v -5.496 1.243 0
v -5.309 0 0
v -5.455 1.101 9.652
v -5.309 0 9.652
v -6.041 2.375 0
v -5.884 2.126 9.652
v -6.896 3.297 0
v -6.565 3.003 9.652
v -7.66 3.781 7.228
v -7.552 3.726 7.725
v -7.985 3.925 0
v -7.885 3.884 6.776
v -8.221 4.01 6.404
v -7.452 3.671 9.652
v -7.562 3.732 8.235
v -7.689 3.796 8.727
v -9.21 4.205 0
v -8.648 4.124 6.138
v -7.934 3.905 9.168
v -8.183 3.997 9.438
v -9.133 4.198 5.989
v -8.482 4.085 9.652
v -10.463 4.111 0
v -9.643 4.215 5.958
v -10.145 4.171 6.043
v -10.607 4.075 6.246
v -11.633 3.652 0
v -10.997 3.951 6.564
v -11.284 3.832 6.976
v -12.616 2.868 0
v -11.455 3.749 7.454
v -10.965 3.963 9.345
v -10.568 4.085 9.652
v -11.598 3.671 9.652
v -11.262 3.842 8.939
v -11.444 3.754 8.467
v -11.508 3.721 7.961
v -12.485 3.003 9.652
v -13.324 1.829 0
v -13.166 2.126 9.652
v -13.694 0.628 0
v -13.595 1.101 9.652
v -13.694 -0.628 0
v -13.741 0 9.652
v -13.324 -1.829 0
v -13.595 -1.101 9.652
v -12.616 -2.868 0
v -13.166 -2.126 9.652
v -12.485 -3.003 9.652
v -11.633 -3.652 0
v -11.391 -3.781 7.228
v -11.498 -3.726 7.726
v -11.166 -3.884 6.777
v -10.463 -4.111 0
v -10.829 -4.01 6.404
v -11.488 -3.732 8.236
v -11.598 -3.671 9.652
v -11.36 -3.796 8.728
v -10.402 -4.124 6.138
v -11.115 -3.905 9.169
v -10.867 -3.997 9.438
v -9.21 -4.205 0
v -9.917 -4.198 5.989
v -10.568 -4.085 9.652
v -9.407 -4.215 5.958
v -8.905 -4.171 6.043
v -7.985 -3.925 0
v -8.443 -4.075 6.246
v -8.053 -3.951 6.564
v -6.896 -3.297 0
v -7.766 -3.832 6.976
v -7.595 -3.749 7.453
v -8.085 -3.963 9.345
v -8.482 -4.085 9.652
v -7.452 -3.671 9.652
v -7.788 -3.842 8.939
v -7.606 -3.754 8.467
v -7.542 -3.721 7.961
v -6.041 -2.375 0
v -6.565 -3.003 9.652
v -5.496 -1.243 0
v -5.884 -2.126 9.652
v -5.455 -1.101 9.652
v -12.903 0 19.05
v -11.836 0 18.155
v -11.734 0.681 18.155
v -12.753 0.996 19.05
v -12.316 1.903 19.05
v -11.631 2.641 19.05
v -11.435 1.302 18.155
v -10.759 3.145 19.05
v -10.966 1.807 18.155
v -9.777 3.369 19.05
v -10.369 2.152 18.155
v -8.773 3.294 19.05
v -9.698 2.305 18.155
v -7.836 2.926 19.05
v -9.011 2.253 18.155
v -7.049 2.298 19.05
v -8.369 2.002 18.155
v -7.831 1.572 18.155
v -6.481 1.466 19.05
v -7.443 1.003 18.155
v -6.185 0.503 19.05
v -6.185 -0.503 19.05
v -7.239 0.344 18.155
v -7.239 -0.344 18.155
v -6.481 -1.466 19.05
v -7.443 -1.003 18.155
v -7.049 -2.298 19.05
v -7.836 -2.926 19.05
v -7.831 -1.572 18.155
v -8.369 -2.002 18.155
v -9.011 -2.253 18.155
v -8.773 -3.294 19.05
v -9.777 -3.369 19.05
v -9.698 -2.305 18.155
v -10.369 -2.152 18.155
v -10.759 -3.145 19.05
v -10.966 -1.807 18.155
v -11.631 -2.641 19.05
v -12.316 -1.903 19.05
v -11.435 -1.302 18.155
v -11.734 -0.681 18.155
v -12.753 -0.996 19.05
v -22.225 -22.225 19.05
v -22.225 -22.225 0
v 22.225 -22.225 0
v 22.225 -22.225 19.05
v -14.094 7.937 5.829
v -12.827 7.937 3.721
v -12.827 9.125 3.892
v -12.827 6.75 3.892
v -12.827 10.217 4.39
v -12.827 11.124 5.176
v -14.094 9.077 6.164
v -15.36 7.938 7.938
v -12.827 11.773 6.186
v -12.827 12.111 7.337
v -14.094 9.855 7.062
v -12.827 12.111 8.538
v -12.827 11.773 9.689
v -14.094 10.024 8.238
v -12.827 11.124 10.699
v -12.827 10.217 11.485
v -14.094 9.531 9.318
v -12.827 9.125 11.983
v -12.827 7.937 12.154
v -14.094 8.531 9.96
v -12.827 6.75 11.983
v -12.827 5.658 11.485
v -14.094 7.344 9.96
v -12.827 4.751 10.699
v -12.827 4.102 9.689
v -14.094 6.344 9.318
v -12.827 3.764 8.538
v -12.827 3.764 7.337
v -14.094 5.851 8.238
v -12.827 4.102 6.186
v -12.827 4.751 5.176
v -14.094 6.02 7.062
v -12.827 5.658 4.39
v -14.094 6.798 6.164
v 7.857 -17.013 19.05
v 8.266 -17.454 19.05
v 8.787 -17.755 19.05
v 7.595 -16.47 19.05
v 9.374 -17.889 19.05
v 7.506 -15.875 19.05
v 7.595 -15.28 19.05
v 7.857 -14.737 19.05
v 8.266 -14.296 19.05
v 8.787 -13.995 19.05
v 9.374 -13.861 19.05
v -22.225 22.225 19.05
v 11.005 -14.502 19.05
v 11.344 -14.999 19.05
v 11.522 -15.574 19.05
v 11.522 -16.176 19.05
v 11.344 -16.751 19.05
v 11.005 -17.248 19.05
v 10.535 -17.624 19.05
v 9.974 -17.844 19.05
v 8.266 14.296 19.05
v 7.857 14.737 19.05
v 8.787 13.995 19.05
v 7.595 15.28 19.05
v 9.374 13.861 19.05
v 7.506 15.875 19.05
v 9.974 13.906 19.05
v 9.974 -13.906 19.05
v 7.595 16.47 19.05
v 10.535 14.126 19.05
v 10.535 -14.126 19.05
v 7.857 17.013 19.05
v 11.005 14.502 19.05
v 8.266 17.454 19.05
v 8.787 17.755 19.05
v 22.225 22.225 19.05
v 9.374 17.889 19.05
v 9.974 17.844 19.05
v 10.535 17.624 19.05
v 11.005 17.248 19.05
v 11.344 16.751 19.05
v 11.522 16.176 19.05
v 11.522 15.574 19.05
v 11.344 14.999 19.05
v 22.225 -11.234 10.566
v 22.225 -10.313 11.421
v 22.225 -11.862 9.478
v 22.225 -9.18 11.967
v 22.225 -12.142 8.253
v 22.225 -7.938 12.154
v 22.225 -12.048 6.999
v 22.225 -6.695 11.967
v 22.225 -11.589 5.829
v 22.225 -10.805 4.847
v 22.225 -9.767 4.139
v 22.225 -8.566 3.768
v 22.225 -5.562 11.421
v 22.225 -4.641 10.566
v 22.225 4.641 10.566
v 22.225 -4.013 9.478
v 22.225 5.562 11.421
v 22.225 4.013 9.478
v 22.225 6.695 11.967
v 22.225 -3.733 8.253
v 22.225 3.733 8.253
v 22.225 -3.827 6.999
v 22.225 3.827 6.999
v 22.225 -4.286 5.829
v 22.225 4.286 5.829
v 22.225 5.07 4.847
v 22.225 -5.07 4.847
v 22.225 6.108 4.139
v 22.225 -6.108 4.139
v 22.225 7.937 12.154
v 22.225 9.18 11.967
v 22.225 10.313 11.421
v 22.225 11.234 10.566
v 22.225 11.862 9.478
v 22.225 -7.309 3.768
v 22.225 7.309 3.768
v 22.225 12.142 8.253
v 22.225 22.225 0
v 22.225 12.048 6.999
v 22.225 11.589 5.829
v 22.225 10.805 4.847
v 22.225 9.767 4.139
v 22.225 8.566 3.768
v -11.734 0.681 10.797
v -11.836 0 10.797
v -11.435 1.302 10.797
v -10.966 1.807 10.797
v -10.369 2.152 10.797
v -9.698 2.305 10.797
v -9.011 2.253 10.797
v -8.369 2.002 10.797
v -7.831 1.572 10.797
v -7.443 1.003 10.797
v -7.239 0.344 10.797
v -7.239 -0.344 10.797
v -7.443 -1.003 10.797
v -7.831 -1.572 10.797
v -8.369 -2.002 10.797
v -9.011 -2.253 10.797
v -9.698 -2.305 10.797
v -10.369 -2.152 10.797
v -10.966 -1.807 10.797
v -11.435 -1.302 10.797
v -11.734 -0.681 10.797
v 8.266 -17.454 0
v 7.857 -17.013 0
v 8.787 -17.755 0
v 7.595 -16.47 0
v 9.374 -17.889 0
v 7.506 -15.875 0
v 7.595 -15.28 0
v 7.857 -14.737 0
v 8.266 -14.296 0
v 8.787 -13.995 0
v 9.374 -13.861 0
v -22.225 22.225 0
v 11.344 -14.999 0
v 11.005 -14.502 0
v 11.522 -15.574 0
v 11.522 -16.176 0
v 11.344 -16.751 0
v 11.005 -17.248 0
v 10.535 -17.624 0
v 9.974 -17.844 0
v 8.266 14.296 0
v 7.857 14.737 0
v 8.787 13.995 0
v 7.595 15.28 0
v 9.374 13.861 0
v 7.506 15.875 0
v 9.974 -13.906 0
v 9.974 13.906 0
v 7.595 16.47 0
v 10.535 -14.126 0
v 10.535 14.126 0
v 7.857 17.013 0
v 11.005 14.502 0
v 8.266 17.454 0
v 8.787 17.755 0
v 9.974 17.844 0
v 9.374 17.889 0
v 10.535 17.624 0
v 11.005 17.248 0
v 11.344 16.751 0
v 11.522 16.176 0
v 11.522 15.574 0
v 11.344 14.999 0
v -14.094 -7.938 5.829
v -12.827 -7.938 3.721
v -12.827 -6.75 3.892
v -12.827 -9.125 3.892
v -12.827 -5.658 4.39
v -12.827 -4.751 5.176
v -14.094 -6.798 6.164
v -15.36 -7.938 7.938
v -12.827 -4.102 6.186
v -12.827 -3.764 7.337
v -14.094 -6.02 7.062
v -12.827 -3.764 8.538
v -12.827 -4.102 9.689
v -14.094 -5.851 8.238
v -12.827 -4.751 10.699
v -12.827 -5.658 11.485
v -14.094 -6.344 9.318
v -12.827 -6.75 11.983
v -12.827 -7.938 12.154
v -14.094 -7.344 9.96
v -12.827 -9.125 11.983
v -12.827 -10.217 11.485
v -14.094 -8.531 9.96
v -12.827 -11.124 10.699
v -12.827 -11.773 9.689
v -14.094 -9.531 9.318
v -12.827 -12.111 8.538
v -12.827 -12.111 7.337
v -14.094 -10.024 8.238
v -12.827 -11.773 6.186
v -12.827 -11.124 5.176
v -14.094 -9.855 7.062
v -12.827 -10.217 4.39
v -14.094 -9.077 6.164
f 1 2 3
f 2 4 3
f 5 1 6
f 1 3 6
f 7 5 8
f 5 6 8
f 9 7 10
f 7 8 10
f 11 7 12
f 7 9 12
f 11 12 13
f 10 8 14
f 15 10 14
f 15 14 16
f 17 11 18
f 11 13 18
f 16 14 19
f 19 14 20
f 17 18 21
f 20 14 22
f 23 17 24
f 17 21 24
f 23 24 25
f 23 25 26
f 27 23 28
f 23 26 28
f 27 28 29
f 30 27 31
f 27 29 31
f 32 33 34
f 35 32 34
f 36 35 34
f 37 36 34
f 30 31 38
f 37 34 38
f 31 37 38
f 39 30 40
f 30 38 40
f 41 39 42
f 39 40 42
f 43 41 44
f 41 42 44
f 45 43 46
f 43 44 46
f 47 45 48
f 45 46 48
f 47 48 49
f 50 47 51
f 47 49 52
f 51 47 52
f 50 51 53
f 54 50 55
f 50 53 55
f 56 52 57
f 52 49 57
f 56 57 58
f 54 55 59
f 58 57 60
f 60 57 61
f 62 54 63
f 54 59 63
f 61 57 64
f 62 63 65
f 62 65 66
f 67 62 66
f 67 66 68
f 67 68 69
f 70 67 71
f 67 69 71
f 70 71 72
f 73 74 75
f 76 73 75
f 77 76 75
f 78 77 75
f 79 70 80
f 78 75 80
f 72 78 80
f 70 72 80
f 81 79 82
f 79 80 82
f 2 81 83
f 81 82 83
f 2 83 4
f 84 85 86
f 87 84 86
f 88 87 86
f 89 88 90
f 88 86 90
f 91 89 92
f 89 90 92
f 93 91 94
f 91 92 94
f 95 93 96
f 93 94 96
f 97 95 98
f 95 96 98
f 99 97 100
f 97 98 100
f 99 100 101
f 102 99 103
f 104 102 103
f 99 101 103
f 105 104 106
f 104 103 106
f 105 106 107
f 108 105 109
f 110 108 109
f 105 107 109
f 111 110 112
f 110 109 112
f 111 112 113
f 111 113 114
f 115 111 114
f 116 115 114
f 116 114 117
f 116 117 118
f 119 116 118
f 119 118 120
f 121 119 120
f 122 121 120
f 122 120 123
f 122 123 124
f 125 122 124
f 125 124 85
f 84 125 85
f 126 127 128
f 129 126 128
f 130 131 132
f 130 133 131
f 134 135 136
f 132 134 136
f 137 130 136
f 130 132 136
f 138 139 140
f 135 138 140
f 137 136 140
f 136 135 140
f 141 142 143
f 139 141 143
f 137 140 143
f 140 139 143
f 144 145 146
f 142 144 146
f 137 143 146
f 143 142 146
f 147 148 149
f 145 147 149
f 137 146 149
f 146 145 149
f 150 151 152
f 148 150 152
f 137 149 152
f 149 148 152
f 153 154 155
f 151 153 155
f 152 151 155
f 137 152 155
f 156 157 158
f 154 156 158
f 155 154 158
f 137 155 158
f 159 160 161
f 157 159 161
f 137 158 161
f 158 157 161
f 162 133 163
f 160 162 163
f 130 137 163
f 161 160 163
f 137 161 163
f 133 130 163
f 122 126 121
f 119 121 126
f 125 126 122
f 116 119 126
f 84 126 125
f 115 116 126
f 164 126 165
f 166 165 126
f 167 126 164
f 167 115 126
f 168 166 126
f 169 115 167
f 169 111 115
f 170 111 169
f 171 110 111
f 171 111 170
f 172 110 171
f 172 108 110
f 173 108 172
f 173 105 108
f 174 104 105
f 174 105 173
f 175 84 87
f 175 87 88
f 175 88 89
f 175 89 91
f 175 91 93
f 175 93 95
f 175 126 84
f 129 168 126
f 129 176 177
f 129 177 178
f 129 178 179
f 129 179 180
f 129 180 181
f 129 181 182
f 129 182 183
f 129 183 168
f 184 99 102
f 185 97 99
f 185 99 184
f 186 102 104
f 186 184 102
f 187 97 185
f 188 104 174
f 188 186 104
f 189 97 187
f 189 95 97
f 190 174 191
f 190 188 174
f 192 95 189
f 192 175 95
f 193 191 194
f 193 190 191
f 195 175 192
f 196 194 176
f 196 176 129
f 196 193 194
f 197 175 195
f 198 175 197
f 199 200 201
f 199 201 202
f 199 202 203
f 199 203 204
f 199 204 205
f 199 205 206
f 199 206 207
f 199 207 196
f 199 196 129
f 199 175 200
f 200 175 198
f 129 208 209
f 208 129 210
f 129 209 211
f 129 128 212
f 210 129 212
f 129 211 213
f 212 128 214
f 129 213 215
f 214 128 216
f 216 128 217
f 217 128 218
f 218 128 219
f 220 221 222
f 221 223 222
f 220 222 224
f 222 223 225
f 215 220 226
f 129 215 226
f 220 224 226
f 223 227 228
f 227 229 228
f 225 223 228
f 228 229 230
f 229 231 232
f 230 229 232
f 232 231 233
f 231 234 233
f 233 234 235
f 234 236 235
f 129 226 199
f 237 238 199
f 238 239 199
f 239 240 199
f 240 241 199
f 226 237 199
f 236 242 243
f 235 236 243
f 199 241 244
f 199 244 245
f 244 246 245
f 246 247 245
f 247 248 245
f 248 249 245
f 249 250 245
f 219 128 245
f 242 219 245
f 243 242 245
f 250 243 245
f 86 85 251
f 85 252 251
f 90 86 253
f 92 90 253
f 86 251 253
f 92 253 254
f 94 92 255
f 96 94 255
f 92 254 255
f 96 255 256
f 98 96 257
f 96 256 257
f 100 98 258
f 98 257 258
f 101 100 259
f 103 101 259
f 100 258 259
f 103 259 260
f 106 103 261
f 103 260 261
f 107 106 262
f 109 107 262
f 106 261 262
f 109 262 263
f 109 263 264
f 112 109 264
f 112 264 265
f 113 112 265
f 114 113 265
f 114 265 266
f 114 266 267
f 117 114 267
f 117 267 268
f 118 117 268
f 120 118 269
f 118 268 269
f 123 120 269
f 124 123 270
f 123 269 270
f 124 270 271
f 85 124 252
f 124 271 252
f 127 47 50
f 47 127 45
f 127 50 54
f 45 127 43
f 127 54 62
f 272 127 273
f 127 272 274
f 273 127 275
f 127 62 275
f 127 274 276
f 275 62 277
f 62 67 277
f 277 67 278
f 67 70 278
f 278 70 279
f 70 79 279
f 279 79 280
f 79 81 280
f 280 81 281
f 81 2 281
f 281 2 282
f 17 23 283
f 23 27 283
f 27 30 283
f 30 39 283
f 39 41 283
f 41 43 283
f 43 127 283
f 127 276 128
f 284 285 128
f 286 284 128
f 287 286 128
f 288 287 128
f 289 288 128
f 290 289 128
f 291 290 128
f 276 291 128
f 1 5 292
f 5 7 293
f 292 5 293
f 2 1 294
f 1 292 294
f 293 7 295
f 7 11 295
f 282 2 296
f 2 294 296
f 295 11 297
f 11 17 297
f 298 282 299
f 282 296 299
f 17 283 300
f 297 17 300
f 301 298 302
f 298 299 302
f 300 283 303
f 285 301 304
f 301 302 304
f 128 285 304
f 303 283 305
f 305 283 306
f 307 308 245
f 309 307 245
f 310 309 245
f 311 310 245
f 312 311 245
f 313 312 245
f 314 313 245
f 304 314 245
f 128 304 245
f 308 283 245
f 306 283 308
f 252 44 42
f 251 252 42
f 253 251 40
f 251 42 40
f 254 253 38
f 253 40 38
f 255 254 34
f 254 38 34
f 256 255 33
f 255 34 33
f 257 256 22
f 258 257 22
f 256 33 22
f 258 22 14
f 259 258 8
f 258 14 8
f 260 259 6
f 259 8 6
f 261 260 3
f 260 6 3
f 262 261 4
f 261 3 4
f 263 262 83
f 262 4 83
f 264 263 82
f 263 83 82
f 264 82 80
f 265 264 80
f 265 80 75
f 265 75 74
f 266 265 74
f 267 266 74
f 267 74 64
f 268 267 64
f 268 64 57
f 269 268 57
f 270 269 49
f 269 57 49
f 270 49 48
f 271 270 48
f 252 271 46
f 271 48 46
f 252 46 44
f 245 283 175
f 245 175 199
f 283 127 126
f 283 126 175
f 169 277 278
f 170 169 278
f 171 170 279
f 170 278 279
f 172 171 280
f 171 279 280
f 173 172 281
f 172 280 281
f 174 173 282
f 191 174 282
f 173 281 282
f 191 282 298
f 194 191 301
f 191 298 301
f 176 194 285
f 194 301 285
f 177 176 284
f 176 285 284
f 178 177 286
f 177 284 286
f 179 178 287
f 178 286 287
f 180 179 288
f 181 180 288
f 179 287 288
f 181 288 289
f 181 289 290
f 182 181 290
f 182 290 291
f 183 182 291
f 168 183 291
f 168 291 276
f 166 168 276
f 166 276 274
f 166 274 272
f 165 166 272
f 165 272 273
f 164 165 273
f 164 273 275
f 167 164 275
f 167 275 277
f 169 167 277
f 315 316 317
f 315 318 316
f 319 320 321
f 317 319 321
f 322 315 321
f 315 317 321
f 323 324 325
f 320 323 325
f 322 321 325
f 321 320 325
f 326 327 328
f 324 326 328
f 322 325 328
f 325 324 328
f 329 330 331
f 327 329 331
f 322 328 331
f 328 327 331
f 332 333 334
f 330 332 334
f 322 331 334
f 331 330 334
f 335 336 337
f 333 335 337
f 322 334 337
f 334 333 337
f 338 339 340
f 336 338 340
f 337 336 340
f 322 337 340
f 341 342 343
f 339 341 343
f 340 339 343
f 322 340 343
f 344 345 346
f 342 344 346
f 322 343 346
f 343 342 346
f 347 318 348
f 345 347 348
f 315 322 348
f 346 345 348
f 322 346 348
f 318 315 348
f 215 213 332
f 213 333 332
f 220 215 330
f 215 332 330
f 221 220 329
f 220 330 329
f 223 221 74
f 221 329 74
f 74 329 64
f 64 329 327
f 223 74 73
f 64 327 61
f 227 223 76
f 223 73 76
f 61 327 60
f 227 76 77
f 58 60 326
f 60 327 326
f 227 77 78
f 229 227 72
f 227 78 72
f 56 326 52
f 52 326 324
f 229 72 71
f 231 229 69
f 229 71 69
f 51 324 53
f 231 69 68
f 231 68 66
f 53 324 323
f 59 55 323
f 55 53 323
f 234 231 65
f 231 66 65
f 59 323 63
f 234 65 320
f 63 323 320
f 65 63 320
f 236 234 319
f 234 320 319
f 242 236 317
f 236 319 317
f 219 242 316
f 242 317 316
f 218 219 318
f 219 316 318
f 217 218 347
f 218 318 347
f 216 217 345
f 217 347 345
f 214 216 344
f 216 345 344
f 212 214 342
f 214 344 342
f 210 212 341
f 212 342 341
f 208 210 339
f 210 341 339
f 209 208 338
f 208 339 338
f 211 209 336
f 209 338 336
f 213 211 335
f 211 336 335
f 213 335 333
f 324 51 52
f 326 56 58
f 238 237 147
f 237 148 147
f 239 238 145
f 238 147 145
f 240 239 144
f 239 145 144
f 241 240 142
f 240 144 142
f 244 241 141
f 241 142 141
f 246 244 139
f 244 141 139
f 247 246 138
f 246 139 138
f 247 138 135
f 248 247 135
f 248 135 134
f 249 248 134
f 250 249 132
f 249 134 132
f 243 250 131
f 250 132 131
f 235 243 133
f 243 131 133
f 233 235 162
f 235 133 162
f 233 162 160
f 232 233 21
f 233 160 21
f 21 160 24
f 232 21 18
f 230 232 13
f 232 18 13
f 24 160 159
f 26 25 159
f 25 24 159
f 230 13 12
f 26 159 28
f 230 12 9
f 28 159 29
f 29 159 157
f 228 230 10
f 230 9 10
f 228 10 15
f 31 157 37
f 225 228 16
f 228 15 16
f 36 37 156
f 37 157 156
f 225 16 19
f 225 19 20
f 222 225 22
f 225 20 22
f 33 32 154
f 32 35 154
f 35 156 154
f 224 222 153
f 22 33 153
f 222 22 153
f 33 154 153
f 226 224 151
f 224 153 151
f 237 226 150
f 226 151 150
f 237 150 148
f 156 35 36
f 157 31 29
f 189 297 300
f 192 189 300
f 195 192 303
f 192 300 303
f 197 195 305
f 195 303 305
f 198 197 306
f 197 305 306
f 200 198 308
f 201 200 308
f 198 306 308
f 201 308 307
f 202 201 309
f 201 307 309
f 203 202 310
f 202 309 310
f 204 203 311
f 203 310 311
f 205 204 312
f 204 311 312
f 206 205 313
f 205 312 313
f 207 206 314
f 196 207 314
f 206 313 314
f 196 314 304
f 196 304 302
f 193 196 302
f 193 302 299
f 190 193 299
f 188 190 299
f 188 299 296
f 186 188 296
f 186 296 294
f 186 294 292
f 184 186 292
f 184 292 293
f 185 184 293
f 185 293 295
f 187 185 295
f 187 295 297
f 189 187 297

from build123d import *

# Parameters (mm, degrees)
SKETCH1_W                         = 44.45
SKETCH1_H                         = 44.45
BOSS_EXTRUDE1_DEPTH               = 19.05
F_12_28_TAPPED_HOLE1_D            = 4.6228
F_12_28_TAPPED_HOLE1_DEPTH        = 11.43
F_12_28_TAPPED_HOLE1_CSINK_D      = 6.7564
F_12_28_TAPPED_HOLE1_CSINK_ANGLE  = 100
F_12_28_TAPPED_HOLE1_TIP          = 1.388829235
PIPE_TAP_DRILL_FOR_1_8_TAP1_D     = 8.4328
PIPE_TAP_DRILL_FOR_1_8_TAP1_DEPTH = 35.052
PIPE_TAP_DRILL_FOR_1_8_TAP1_TIP   = 2.533468714
F_10_32_TAPPED_HOLE1_D            = 4.0386
F_3_8_24_TAPPED_HOLE1_D           = 8.4328
F_3_8_24_TAPPED_HOLE1_DEPTH       = 9.652
F_3_8_24_TAPPED_HOLE1_TIP         = 2.533468714


with BuildPart() as part:
    # Sketch1 → Boss-Extrude1 (new body)
    with BuildSketch(Plane.XY):
        Rectangle(SKETCH1_W, SKETCH1_H)
    extrude(amount=BOSS_EXTRUDE1_DEPTH)

    # #12-28 Tapped Hole1
    with Locations(Plane.XY.offset(19.05)):
        with Locations((-9.525, 0)):
            CounterSinkHole(F_12_28_TAPPED_HOLE1_D / 2, F_12_28_TAPPED_HOLE1_CSINK_D / 2, depth=F_12_28_TAPPED_HOLE1_DEPTH, counter_sink_angle=F_12_28_TAPPED_HOLE1_CSINK_ANGLE)
            with Locations((0, 0, -(F_12_28_TAPPED_HOLE1_DEPTH + F_12_28_TAPPED_HOLE1_TIP / 2))):  # 118° drill point
                Cone(0, F_12_28_TAPPED_HOLE1_D / 2, F_12_28_TAPPED_HOLE1_TIP, mode=Mode.SUBTRACT)

    # Pipe Tap Drill for 1/8 Tap1
    with Locations(Plane(origin=(22.225, 0, 0), x_dir=(0, 0, -1), z_dir=(1, 0, 0))):
        with Locations((-7.9375, 7.9375), (-7.9375, -7.9375)):
            Hole(PIPE_TAP_DRILL_FOR_1_8_TAP1_D / 2, depth=PIPE_TAP_DRILL_FOR_1_8_TAP1_DEPTH)
            with Locations((0, 0, -(PIPE_TAP_DRILL_FOR_1_8_TAP1_DEPTH + PIPE_TAP_DRILL_FOR_1_8_TAP1_TIP / 2))):  # 118° drill point
                Cone(0, PIPE_TAP_DRILL_FOR_1_8_TAP1_D / 2, PIPE_TAP_DRILL_FOR_1_8_TAP1_TIP, mode=Mode.SUBTRACT)

    # #10-32 Tapped Hole1 (through all)
    with Locations(Plane.XY.offset(19.05)):
        with Locations((9.525, 15.875), (9.525, -15.875)):
            Hole(F_10_32_TAPPED_HOLE1_D / 2)

    # 3/8-24 Tapped Hole1
    with Locations(Plane(origin=(0, 0, 0), x_dir=(-1, 0, 0), z_dir=(0, 0, -1))):
        with Locations((9.525, 0)):
            Hole(F_3_8_24_TAPPED_HOLE1_D / 2, depth=F_3_8_24_TAPPED_HOLE1_DEPTH)
            with Locations((0, 0, -(F_3_8_24_TAPPED_HOLE1_DEPTH + F_3_8_24_TAPPED_HOLE1_TIP / 2))):  # 118° drill point
                Cone(0, F_3_8_24_TAPPED_HOLE1_D / 2, F_3_8_24_TAPPED_HOLE1_TIP, mode=Mode.SUBTRACT)


solid = part.part
